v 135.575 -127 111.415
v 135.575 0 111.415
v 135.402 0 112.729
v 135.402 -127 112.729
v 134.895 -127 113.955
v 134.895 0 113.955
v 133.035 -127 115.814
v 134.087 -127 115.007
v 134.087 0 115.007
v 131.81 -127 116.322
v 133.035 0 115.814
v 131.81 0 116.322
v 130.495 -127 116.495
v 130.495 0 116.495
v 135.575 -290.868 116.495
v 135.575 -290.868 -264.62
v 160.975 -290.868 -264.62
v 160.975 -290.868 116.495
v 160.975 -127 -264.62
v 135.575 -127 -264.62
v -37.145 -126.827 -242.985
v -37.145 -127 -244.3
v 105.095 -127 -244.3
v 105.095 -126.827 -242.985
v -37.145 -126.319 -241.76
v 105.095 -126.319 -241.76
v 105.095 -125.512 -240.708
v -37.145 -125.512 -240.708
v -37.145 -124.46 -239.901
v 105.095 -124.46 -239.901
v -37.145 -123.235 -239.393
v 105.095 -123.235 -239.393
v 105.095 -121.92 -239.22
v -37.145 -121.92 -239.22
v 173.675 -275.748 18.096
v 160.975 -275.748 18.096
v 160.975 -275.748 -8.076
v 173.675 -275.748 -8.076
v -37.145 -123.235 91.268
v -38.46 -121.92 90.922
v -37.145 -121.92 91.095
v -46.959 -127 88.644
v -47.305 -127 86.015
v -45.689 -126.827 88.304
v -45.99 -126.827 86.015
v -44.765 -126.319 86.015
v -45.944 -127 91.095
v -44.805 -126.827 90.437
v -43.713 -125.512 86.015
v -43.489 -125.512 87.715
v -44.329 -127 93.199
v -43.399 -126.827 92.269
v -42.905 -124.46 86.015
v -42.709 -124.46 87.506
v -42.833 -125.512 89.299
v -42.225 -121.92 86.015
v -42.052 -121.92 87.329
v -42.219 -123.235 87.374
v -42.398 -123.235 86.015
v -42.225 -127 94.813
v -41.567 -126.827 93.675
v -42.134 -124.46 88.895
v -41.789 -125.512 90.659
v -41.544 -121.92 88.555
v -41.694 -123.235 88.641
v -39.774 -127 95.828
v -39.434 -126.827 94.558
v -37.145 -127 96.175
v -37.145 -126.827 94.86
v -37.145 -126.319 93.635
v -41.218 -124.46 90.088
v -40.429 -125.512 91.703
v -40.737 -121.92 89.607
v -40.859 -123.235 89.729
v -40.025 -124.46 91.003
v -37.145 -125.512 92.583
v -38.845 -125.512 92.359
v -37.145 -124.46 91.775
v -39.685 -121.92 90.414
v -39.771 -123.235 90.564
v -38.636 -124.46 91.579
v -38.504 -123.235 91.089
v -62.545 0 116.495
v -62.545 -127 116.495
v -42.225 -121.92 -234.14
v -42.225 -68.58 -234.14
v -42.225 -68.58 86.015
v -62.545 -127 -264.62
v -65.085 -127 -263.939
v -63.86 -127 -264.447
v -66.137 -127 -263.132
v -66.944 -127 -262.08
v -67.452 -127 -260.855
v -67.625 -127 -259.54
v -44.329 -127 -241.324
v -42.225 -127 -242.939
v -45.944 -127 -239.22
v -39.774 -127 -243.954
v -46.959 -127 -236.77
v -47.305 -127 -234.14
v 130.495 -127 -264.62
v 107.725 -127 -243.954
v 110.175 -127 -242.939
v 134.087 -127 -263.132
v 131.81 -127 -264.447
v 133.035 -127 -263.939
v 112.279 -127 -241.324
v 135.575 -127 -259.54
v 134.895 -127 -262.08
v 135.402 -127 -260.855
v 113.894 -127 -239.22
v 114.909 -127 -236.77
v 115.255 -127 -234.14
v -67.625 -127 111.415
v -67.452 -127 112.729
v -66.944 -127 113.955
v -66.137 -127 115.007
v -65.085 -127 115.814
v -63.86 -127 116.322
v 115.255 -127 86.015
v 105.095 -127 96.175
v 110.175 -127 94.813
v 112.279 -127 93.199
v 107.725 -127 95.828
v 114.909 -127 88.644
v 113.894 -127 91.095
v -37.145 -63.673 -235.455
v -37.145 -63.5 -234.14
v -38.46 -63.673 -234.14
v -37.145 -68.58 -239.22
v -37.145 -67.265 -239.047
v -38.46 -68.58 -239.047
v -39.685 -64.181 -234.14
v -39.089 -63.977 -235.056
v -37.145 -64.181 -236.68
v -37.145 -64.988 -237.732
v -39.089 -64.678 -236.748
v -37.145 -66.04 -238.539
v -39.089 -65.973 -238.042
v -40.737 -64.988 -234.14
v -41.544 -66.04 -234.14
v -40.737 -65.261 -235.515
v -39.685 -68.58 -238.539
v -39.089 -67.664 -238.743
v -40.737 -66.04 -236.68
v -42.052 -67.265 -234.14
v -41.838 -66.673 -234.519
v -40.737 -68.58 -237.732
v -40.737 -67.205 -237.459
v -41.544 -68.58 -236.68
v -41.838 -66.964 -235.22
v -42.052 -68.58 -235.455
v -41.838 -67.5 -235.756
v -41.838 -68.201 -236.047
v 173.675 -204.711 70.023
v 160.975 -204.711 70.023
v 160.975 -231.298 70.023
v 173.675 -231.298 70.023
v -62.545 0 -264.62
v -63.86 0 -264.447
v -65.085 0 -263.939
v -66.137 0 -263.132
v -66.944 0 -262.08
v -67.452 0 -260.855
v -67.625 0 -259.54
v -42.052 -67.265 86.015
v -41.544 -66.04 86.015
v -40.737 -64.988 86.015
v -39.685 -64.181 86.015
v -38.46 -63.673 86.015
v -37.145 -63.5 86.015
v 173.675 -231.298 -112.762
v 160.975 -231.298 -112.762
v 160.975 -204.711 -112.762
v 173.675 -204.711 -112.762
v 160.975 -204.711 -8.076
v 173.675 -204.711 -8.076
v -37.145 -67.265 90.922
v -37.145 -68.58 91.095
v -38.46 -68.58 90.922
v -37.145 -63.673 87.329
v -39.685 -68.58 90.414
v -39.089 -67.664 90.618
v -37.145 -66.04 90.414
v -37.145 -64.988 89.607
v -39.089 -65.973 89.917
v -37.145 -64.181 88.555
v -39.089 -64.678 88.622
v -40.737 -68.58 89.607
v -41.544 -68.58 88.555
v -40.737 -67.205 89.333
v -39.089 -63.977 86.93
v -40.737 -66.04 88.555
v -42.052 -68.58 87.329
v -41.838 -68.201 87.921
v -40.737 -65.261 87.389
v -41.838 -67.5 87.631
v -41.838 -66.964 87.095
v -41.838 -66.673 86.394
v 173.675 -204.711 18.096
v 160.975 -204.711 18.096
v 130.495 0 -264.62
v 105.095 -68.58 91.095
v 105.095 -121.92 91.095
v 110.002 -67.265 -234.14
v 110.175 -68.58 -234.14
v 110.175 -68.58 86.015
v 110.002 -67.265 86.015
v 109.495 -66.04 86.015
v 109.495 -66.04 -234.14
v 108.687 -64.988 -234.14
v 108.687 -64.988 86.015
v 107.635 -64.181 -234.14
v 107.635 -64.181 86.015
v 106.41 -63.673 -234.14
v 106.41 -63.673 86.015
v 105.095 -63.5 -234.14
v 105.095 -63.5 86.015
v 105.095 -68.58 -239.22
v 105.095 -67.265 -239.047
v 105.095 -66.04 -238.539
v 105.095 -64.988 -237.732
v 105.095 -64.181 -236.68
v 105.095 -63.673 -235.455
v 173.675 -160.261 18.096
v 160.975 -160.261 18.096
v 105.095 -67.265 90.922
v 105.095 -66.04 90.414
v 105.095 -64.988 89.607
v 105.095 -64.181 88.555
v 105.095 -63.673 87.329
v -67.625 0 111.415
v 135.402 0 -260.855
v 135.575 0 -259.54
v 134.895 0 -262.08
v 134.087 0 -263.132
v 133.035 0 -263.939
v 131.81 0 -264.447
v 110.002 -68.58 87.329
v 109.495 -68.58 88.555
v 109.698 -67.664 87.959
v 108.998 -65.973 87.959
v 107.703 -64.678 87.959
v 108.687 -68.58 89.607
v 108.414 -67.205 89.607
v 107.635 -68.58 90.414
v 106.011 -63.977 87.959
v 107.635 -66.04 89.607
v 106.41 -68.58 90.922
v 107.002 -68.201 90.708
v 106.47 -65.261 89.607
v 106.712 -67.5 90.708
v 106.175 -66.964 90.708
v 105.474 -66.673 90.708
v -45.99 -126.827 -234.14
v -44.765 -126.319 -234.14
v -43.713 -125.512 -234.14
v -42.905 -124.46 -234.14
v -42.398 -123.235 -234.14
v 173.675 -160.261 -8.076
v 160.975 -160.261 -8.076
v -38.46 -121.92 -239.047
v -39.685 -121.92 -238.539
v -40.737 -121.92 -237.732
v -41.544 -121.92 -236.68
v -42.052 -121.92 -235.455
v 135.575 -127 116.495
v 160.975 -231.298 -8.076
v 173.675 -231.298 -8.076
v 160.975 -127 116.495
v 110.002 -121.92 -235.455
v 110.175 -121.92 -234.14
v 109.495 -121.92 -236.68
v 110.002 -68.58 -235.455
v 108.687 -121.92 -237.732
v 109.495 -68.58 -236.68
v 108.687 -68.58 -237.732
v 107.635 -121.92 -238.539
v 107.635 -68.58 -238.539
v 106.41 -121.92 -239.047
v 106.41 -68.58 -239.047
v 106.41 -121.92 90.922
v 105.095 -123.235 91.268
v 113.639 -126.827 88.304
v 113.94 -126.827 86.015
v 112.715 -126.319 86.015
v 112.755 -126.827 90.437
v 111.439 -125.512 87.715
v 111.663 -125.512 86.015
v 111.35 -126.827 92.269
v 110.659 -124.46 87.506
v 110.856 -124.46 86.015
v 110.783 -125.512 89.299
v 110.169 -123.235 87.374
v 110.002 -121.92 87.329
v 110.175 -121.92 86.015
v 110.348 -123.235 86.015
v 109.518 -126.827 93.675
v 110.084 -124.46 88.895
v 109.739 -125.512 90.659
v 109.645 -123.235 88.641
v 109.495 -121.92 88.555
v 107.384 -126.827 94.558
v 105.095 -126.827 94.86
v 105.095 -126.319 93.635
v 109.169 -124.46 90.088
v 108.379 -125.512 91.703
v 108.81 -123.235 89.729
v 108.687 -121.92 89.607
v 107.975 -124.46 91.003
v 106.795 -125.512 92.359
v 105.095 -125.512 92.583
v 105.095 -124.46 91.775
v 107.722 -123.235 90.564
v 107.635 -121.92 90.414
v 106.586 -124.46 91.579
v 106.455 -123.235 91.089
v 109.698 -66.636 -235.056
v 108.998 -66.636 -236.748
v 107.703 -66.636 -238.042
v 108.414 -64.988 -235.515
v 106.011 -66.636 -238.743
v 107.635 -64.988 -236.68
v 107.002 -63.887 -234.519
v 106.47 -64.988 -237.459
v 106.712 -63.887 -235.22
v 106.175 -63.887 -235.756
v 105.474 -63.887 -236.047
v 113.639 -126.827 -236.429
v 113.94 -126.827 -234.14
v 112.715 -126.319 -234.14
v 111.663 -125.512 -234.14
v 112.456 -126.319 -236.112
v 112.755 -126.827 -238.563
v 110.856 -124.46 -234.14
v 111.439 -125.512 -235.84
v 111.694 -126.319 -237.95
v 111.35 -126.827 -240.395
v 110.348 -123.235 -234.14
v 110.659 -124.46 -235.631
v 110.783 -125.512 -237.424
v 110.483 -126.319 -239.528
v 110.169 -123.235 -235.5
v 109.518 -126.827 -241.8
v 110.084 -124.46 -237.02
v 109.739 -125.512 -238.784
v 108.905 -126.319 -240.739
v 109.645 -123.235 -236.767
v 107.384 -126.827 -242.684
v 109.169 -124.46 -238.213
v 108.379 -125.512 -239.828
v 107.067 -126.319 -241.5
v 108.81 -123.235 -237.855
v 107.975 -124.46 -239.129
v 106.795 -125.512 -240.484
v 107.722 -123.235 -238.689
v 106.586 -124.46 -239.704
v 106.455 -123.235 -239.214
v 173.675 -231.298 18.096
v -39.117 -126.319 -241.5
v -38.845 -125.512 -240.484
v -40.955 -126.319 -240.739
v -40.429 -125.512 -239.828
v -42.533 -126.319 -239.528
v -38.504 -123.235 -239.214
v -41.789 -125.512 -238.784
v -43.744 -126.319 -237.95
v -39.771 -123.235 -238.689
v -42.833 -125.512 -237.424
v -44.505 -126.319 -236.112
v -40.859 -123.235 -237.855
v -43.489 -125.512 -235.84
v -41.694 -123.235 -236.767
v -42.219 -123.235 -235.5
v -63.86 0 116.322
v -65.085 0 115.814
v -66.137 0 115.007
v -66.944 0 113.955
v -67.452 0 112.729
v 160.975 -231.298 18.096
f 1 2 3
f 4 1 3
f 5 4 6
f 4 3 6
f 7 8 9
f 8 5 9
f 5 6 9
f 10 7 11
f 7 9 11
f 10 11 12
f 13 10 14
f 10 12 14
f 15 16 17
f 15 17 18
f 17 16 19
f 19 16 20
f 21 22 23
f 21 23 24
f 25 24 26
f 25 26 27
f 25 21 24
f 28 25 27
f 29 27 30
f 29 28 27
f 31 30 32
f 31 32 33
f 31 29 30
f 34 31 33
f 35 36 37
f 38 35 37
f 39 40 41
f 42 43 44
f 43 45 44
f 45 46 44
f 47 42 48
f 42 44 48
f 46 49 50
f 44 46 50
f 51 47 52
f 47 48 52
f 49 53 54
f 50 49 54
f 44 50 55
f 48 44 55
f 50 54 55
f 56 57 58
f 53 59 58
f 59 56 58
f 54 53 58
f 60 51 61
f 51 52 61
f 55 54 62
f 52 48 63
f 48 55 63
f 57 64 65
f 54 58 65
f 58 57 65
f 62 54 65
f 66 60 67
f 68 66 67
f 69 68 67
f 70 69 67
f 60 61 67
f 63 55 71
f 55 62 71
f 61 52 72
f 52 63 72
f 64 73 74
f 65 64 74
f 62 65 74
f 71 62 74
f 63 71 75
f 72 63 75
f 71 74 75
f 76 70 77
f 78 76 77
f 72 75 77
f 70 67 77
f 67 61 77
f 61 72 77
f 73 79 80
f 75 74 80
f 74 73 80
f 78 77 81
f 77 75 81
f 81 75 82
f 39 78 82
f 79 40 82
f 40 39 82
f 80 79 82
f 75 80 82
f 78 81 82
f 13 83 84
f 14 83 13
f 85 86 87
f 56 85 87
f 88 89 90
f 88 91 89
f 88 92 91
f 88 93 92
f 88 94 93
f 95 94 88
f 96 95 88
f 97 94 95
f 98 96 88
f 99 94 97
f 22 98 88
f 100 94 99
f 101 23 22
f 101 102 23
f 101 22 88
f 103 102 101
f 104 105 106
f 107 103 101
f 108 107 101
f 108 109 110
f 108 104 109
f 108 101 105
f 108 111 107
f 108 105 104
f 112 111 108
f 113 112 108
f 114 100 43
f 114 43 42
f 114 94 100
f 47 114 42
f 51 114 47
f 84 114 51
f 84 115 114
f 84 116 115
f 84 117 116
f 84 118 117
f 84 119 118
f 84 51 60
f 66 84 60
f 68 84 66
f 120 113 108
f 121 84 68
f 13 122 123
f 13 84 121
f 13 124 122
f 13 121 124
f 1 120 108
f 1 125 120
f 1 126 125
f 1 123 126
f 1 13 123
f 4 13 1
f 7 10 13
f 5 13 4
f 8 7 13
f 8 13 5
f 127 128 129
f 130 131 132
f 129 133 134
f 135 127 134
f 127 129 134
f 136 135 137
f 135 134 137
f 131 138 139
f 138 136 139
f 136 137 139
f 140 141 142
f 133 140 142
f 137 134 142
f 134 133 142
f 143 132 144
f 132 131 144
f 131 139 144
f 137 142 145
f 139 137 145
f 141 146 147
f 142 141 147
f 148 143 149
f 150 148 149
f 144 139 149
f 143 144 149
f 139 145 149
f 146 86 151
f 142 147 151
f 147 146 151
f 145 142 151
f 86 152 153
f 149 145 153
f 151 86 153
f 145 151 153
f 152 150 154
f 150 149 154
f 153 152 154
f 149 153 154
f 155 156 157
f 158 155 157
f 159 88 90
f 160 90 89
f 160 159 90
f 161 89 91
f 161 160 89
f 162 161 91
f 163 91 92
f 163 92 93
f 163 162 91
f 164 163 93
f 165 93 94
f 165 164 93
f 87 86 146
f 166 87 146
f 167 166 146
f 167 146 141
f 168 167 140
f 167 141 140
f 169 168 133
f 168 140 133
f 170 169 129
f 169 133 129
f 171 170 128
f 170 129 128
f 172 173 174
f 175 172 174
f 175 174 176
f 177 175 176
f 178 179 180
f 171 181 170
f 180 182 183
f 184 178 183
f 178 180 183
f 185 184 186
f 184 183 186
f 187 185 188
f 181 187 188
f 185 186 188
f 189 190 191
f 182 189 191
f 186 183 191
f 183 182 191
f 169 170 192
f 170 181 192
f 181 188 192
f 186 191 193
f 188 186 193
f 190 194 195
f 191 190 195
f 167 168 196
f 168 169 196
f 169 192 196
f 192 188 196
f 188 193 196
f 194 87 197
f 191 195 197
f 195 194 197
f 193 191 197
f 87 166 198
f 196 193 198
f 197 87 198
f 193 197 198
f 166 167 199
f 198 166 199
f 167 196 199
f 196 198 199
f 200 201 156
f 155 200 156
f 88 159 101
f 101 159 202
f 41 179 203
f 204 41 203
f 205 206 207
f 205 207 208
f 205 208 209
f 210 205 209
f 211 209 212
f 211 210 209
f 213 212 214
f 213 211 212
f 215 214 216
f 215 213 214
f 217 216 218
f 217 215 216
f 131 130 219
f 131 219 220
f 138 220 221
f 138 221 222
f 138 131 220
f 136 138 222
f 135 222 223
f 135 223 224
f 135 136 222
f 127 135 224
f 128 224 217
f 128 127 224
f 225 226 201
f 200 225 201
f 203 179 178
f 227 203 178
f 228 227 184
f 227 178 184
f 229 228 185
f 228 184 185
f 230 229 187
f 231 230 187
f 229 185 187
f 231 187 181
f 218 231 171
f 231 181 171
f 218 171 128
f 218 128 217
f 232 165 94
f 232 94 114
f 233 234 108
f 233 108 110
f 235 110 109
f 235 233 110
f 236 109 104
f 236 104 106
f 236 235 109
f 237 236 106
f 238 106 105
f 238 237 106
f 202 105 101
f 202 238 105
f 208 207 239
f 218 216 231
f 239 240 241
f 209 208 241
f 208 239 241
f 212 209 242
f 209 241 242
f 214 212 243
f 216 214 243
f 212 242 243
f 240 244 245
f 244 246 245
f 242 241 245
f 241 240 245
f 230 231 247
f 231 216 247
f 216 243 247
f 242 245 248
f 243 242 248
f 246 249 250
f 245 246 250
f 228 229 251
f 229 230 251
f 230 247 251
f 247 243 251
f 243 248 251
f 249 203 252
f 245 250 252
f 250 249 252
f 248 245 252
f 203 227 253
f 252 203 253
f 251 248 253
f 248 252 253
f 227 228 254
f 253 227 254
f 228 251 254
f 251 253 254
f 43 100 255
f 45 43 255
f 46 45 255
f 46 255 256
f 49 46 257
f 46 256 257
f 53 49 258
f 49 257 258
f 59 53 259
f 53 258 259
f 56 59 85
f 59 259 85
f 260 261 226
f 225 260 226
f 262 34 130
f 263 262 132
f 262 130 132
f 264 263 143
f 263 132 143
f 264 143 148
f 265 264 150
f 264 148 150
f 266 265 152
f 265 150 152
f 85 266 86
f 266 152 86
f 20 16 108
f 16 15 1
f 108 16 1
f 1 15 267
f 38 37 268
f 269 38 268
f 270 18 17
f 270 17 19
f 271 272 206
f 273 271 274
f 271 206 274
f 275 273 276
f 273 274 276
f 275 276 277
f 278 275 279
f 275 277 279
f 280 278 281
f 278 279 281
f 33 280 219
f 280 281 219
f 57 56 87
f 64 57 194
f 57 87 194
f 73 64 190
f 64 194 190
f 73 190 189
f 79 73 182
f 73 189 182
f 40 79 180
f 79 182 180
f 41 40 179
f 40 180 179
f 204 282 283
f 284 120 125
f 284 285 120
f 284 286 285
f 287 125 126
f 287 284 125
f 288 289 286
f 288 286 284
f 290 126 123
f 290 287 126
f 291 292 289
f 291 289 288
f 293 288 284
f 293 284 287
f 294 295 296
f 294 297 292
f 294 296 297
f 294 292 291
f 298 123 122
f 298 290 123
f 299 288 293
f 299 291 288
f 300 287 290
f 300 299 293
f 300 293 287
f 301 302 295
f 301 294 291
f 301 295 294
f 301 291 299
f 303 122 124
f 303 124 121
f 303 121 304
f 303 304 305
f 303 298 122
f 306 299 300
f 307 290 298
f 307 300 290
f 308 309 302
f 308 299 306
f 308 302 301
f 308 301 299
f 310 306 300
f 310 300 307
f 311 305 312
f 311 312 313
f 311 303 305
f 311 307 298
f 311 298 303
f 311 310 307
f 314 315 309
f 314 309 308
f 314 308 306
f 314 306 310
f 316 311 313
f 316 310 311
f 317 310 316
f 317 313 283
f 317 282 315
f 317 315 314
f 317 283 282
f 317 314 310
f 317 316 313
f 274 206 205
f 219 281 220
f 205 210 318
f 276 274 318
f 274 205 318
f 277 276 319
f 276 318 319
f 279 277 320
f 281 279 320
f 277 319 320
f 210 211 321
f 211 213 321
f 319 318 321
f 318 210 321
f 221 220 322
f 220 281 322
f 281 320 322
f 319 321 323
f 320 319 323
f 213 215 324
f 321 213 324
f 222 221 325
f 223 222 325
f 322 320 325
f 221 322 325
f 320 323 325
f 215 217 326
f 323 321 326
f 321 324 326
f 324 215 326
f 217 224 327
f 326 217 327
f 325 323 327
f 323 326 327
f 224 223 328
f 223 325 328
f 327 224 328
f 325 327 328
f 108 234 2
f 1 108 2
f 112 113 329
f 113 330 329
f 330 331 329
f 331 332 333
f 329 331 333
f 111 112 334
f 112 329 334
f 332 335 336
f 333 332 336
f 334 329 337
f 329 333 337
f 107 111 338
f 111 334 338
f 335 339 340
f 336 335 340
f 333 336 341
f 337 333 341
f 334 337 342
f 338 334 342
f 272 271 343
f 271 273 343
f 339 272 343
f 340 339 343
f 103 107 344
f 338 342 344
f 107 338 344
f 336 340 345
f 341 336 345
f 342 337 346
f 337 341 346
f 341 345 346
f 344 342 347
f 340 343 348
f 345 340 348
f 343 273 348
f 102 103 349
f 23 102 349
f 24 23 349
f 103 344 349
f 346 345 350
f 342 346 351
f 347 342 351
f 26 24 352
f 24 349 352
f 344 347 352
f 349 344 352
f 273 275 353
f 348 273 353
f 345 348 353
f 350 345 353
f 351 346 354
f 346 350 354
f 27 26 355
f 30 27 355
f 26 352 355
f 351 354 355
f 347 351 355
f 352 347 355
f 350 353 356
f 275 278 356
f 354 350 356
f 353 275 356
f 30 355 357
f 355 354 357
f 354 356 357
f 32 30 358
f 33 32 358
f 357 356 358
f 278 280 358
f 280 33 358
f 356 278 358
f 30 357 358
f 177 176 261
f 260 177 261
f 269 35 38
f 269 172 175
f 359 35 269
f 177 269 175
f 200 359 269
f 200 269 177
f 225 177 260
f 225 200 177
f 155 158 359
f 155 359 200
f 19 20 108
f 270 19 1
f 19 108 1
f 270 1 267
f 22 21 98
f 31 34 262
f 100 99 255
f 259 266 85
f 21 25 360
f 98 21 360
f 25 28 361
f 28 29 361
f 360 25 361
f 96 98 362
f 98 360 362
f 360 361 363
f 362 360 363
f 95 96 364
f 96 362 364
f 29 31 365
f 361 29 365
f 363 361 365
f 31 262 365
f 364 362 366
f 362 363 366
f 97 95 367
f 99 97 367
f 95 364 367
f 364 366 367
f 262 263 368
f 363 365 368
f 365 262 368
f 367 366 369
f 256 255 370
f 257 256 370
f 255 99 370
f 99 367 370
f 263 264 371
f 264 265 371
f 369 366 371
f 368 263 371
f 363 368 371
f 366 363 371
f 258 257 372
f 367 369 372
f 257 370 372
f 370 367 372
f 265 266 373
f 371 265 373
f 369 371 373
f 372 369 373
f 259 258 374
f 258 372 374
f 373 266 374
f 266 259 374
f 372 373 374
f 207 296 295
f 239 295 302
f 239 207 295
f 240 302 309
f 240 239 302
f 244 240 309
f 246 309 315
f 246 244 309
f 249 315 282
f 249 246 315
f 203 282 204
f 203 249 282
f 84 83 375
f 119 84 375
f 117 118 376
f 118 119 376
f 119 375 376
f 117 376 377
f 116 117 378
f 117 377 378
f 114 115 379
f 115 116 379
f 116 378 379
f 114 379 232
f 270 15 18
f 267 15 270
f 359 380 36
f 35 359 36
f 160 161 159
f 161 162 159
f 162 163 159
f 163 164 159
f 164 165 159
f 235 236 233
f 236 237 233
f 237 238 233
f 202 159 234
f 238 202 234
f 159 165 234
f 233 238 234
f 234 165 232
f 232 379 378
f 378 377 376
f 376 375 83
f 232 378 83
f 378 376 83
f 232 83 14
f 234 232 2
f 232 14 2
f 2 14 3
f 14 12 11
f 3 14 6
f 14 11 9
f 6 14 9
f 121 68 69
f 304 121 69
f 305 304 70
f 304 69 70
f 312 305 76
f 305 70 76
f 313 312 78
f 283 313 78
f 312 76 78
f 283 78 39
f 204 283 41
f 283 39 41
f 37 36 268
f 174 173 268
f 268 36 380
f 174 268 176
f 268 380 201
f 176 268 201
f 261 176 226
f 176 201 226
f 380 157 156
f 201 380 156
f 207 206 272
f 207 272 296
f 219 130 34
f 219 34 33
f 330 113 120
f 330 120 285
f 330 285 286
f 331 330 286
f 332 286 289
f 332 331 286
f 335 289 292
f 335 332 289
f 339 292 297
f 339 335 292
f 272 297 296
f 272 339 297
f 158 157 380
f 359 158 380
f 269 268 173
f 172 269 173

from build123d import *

# Parameters (mm, degrees)
F0_W         = 203.2
F0_H         = 381.1146762907
F1_DEPTH     = 127
F2_T         = -25.4
F3_W         = 163.8680438995
F3_H         = 381.1146762907
F4_DEPTH     = 25.4
F5_W         = 152.4
F5_H         = 330.3146762907
F6_DEPTH     = 38.1
F7_T1_DEPTH  = 320.1546762907
F7_T3_DEPTH  = 142.24
F7_T5_DEPTH  = 58.42
F7_S9_W      = 5.08
F7_S9_H      = 5.08
F7_T10_DEPTH = 5.08
F7_S15_W     = 5.08
F7_S15_H     = 5.08
F7_T16_DEPTH = 5.08
F7_S21_W     = 5.08
F7_S21_H     = 5.08
F7_T22_DEPTH = 5.08
F7_S27_W     = 5.08
F7_S27_H     = 5.08
F7_T28_DEPTH = 5.08
F7_T31_DEPTH = 152.4
F7_T33_DEPTH = 142.24
F7_T35_DEPTH = 320.1546762907
F7_T38_ANGLE = 90
F7_T40_ANGLE = 90
F7_T42_ANGLE = 90
F7_T44_ANGLE = 90
F9_DEPTH     = 12.7


# Not quite as in the source:
# - a fillet or chamfer that OpenCascade refuses, or shapes differently, is made with other operations: its cross-section is extruded or revolved along the edge and cut away or added


with BuildPart() as f1:
    # F0 (on Front) → F1 (new body)
    with BuildSketch(Plane.XZ):
        with Locations((33.975193277, -74.0627218038)):
            Rectangle(F0_W, F0_H)
    extrude(amount=F1_DEPTH)

    # F2
    f2_openings = [f1.faces().sort_by_distance(p)[0] for p in [
        (33.975193, -127, -74.062722),
    ]]
    offset(amount=F2_T, openings=f2_openings)

    # F3 (on face) → F4 (join)
    with BuildSketch(Plane.YZ.offset(135.575193277)):
        with Locations((-208.9340219498, -74.0627218038)):
            Rectangle(F3_W, F3_H)
    extrude(amount=F4_DEPTH)

    # F5 (on face) → F6 (join)
    with BuildSketch(Plane.XZ.offset(25.4)):
        with Locations((33.975193277, -74.0627218038)):
            Rectangle(F5_W, F5_H)
    extrude(amount=F6_DEPTH)

    # F7: fillet of radius 5.08 on 16 edges, made by hand

    # F7_s2 → F7_t1 (join)
    with BuildSketch(Plane.XY.offset(-234.1400599492)):
        with BuildLine():
            ThreePointArc((-42.224806723, -68.58), (-40.7369091714, -64.9878975516), (-37.144806723, -63.5))
            Line((-37.144806723, -63.5), (-42.224806723, -63.5))
            Line((-42.224806723, -63.5), (-42.224806723, -68.58))
        make_face()
        with BuildLine():
            ThreePointArc((110.175193277, -68.58), (108.6872957254, -64.9878975516), (105.095193277, -63.5))
            Line((105.095193277, -63.5), (110.175193277, -63.5))
            Line((110.175193277, -63.5), (110.175193277, -68.58))
        make_face()
    extrude(amount=F7_T1_DEPTH)

    # F7_s4 → F7_t3 (join)
    with BuildSketch(Plane.YZ.offset(-37.144806723)):
        with BuildLine():
            ThreePointArc((-68.58, 91.0946163416), (-64.9878975516, 89.60671879), (-63.5, 86.0146163416))
            Line((-63.5, 86.0146163416), (-63.5, 91.0946163416))
            Line((-63.5, 91.0946163416), (-68.58, 91.0946163416))
        make_face()
        with BuildLine():
            ThreePointArc((-68.58, -239.2200599492), (-64.9878975516, -237.7321623976), (-63.5, -234.1400599492))
            Line((-63.5, -234.1400599492), (-63.5, -239.2200599492))
            Line((-63.5, -239.2200599492), (-68.58, -239.2200599492))
        make_face()
    extrude(amount=F7_T3_DEPTH)

    # F7_s6 → F7_t5 (join)
    with BuildSketch(Plane.XZ.offset(68.58)):
        with BuildLine():
            ThreePointArc((-42.224806723, 86.0146163416), (-40.7369091714, 89.60671879), (-37.144806723, 91.0946163416))
            Line((-37.144806723, 91.0946163416), (-42.224806723, 91.0946163416))
            Line((-42.224806723, 91.0946163416), (-42.224806723, 86.0146163416))
        make_face()
        with BuildLine():
            ThreePointArc((110.175193277, 86.0146163416), (108.6872957254, 89.60671879), (105.095193277, 91.0946163416))
            Line((105.095193277, 91.0946163416), (110.175193277, 91.0946163416))
            Line((110.175193277, 91.0946163416), (110.175193277, 86.0146163416))
        make_face()
        with BuildLine():
            ThreePointArc((110.175193277, -234.1400599492), (108.6872957254, -237.7321623976), (105.095193277, -239.2200599492))
            Line((105.095193277, -239.2200599492), (110.175193277, -239.2200599492))
            Line((110.175193277, -239.2200599492), (110.175193277, -234.1400599492))
        make_face()
        with BuildLine():
            ThreePointArc((-37.144806723, -239.2200599492), (-40.7369091714, -237.7321623976), (-42.224806723, -234.1400599492))
            Line((-42.224806723, -234.1400599492), (-42.224806723, -239.2200599492))
            Line((-42.224806723, -239.2200599492), (-37.144806723, -239.2200599492))
        make_face()
    extrude(amount=F7_T5_DEPTH)


with BuildPart() as f7_tool8:
    # F7_s9 → F7_t10 (new body)
    with BuildSketch(Plane.YZ.offset(-37.144806723)):
        with Locations((-66.04, 88.5546163416)):
            Rectangle(F7_S9_W, F7_S9_H)
    extrude(amount=-F7_T10_DEPTH)

    # F7_s11 → F7_t12 (revolve, cut)
    with BuildSketch(Plane(origin=(-37.144806723, -68.58, 86.0146163416), x_dir=(0, -0.7071067812, -0.7071067812), z_dir=(0, 0.7071067812, -0.7071067812))):
        with BuildLine():
            ThreePointArc((0, -5.08), (5.08, 0), (0, 5.08))
            Line((0, 5.08), (0, -5.08))
        make_face()
    revolve(axis=Axis((-37.144806723, -68.58, 86.0146163416), (-1, 0, 0)), mode=Mode.SUBTRACT)


with BuildPart() as f1_1:
    add(f1.part)

    # F7_t7: union F7_tool8
    add(f7_tool8.part)


with BuildPart() as f7_tool14:
    # F7_s15 → F7_t16 (new body)
    with BuildSketch(Plane.YZ.offset(-37.144806723)):
        with Locations((-66.04, -236.6800599492)):
            Rectangle(F7_S15_W, F7_S15_H)
    extrude(amount=-F7_T16_DEPTH)

    # F7_s17 → F7_t18 (revolve, cut)
    with BuildSketch(Plane(origin=(-37.144806723, -68.58, -234.1400599492), x_dir=(0, -0.7071067812, 0.7071067812), z_dir=(0, -0.7071067812, -0.7071067812))):
        with BuildLine():
            ThreePointArc((0, -5.08), (5.08, 0), (0, 5.08))
            Line((0, 5.08), (0, -5.08))
        make_face()
    revolve(axis=Axis((-37.144806723, -68.58, -234.1400599492), (-1, 0, 0)), mode=Mode.SUBTRACT)


with BuildPart() as f1_2:
    add(f1_1.part)

    # F7_t13: union F7_tool14
    add(f7_tool14.part)


with BuildPart() as f7_tool20:
    # F7_s21 → F7_t22 (new body)
    with BuildSketch(Plane.XY.offset(86.0146163416)):
        with Locations((107.635193277, -66.04)):
            Rectangle(F7_S21_W, F7_S21_H)
    extrude(amount=F7_T22_DEPTH)

    # F7_s23 → F7_t24 (revolve, cut)
    with BuildSketch(Plane(origin=(105.095193277, -68.58, 86.0146163416), x_dir=(-0.7071067812, -0.7071067812, 0), z_dir=(-0.7071067812, 0.7071067812, 0))):
        with BuildLine():
            ThreePointArc((0, -5.08), (5.08, 0), (0, 5.08))
            Line((0, 5.08), (0, -5.08))
        make_face()
    revolve(axis=Axis((105.095193277, -68.58, 86.0146163416), (0, 0, 1)), mode=Mode.SUBTRACT)


with BuildPart() as f1_3:
    add(f1_2.part)

    # F7_t19: union F7_tool20
    add(f7_tool20.part)


with BuildPart() as f7_tool26:
    # F7_s27 → F7_t28 (new body)
    with BuildSketch(Plane.XZ.offset(68.58)):
        with Locations((107.635193277, -236.6800599492)):
            Rectangle(F7_S27_W, F7_S27_H)
    extrude(amount=-F7_T28_DEPTH)

    # F7_s29 → F7_t30 (revolve, cut)
    with BuildSketch(Plane(origin=(105.095193277, -68.58, -234.1400599492), x_dir=(-0.7071067812, 0, 0.7071067812), z_dir=(-0.7071067812, 0, -0.7071067812))):
        with BuildLine():
            ThreePointArc((0, -5.08), (5.08, 0), (0, 5.08))
            Line((0, 5.08), (0, -5.08))
        make_face()
    revolve(axis=Axis((105.095193277, -68.58, -234.1400599492), (0, 1, 0)), mode=Mode.SUBTRACT)


with BuildPart() as f1_4:
    add(f1_3.part)

    # F7_t25: union F7_tool26
    add(f7_tool26.part)

    # F7_s32 → F7_t31 (cut)
    with BuildSketch(Plane.XZ.offset(-12.7)):
        with BuildLine():
            ThreePointArc((-62.544806723, -264.6200599492), (-66.1369091714, -263.1321623976), (-67.624806723, -259.5400599492))
            Line((-67.624806723, -259.5400599492), (-67.624806723, -264.6200599492))
            Line((-67.624806723, -264.6200599492), (-62.544806723, -264.6200599492))
        make_face()
        with BuildLine():
            ThreePointArc((135.575193277, -259.5400599492), (134.0872957254, -263.1321623976), (130.495193277, -264.6200599492))
            Line((130.495193277, -264.6200599492), (135.575193277, -264.6200599492))
            Line((135.575193277, -264.6200599492), (135.575193277, -259.5400599492))
        make_face()
        with BuildLine():
            ThreePointArc((135.575193277, 111.4146163416), (134.0872957254, 115.00671879), (130.495193277, 116.4946163416))
            Line((130.495193277, 116.4946163416), (135.575193277, 116.4946163416))
            Line((135.575193277, 116.4946163416), (135.575193277, 111.4146163416))
        make_face()
        with BuildLine():
            ThreePointArc((-62.544806723, 116.4946163416), (-66.1369091714, 115.00671879), (-67.624806723, 111.4146163416))
            Line((-67.624806723, 111.4146163416), (-67.624806723, 116.4946163416))
            Line((-67.624806723, 116.4946163416), (-62.544806723, 116.4946163416))
        make_face()
    extrude(amount=F7_T31_DEPTH, mode=Mode.SUBTRACT)

    # F7_s34 → F7_t33 (cut)
    with BuildSketch(Plane.YZ.offset(-37.144806723)):
        with BuildLine():
            ThreePointArc((-127, 96.1746163416), (-125.5121024484, 92.5825138932), (-121.92, 91.0946163416))
            Line((-121.92, 91.0946163416), (-127, 91.0946163416))
            Line((-127, 91.0946163416), (-127, 96.1746163416))
        make_face()
        with BuildLine():
            ThreePointArc((-127, -244.3000599492), (-125.5121024484, -240.7079575007), (-121.92, -239.2200599492))
            Line((-121.92, -239.2200599492), (-127, -239.2200599492))
            Line((-127, -239.2200599492), (-127, -244.3000599492))
        make_face()
    extrude(amount=F7_T33_DEPTH, mode=Mode.SUBTRACT)

    # F7_s36 → F7_t35 (cut)
    with BuildSketch(Plane.XY.offset(-234.1400599492)):
        with BuildLine():
            ThreePointArc((115.255193277, -127), (111.6630908286, -125.5121024484), (110.175193277, -121.92))
            Line((110.175193277, -121.92), (110.175193277, -127))
            Line((110.175193277, -127), (115.255193277, -127))
        make_face()
        with BuildLine():
            ThreePointArc((-47.304806723, -127), (-43.7127042746, -125.5121024484), (-42.224806723, -121.92))
            Line((-42.224806723, -121.92), (-42.224806723, -127))
            Line((-42.224806723, -127), (-47.304806723, -127))
        make_face()
    extrude(amount=F7_T35_DEPTH, mode=Mode.SUBTRACT)

    # F7_s37 → F7_t38 (revolve, cut)
    with BuildSketch(Plane.XY.offset(86.0146163416)):
        with BuildLine():
            ThreePointArc((-47.304806723, -127), (-43.7127042746, -125.5121024484), (-42.224806723, -121.92))
            Line((-42.224806723, -121.92), (-42.224806723, -127))
            Line((-42.224806723, -127), (-47.304806723, -127))
        make_face()
    revolve(axis=Axis((-37.144806723, -127, 86.0146163416), (0, 1, 0)), revolution_arc=F7_T38_ANGLE, mode=Mode.SUBTRACT)

    # F7_s39 → F7_t40 (revolve, cut)
    with BuildSketch(Plane.YZ.offset(-37.144806723)):
        with BuildLine():
            ThreePointArc((-127, -244.3000599492), (-125.5121024484, -240.7079575007), (-121.92, -239.2200599492))
            Line((-121.92, -239.2200599492), (-127, -239.2200599492))
            Line((-127, -239.2200599492), (-127, -244.3000599492))
        make_face()
    revolve(axis=Axis((-37.144806723, -127, -234.1400599492), (0, 1, 0)), revolution_arc=F7_T40_ANGLE, mode=Mode.SUBTRACT)

    # F7_s41 → F7_t42 (revolve, cut)
    with BuildSketch(Plane.XY.offset(-234.1400599492)):
        with BuildLine():
            ThreePointArc((115.255193277, -127), (111.6630908286, -125.5121024484), (110.175193277, -121.92))
            Line((110.175193277, -121.92), (110.175193277, -127))
            Line((110.175193277, -127), (115.255193277, -127))
        make_face()
    revolve(axis=Axis((105.095193277, -127, -234.1400599492), (0, 1, 0)), revolution_arc=F7_T42_ANGLE, mode=Mode.SUBTRACT)

    # F7_s43 → F7_t44 (revolve, cut)
    with BuildSketch(Plane.XY.offset(86.0146163416)):
        with BuildLine():
            ThreePointArc((115.255193277, -127), (111.6630908286, -125.5121024484), (110.175193277, -121.92))
            Line((110.175193277, -121.92), (110.175193277, -127))
            Line((110.175193277, -127), (115.255193277, -127))
        make_face()
    revolve(axis=Axis((105.095193277, -127, 86.0146163416), (0, -1, 0)), revolution_arc=F7_T44_ANGLE, mode=Mode.SUBTRACT)


with BuildPart() as f9:
    # F8 (on face) → F9 (new body)
    with BuildSketch(Plane.YZ.offset(160.975193277)):
        Polygon((-204.7111040329, 70.0232706935), (-231.2980165388, 70.0232706935), (-231.2980165388, 18.0956996665), (-275.7480165388, 18.0956996665), (-275.7480165388, -8.0757932739), (-231.2980165388, -8.0757932739), (-231.2980165388, -112.7617754013), (-204.7111040329, -112.7617754013), (-204.7111040329, -8.0757932739), (-160.2611040329, -8.0757932739), (-160.2611040329, 18.0956996665), (-204.7111040329, 18.0956996665), align=None)
    extrude(amount=F9_DEPTH)


solid = Compound([f1_4.part, f9.part])
